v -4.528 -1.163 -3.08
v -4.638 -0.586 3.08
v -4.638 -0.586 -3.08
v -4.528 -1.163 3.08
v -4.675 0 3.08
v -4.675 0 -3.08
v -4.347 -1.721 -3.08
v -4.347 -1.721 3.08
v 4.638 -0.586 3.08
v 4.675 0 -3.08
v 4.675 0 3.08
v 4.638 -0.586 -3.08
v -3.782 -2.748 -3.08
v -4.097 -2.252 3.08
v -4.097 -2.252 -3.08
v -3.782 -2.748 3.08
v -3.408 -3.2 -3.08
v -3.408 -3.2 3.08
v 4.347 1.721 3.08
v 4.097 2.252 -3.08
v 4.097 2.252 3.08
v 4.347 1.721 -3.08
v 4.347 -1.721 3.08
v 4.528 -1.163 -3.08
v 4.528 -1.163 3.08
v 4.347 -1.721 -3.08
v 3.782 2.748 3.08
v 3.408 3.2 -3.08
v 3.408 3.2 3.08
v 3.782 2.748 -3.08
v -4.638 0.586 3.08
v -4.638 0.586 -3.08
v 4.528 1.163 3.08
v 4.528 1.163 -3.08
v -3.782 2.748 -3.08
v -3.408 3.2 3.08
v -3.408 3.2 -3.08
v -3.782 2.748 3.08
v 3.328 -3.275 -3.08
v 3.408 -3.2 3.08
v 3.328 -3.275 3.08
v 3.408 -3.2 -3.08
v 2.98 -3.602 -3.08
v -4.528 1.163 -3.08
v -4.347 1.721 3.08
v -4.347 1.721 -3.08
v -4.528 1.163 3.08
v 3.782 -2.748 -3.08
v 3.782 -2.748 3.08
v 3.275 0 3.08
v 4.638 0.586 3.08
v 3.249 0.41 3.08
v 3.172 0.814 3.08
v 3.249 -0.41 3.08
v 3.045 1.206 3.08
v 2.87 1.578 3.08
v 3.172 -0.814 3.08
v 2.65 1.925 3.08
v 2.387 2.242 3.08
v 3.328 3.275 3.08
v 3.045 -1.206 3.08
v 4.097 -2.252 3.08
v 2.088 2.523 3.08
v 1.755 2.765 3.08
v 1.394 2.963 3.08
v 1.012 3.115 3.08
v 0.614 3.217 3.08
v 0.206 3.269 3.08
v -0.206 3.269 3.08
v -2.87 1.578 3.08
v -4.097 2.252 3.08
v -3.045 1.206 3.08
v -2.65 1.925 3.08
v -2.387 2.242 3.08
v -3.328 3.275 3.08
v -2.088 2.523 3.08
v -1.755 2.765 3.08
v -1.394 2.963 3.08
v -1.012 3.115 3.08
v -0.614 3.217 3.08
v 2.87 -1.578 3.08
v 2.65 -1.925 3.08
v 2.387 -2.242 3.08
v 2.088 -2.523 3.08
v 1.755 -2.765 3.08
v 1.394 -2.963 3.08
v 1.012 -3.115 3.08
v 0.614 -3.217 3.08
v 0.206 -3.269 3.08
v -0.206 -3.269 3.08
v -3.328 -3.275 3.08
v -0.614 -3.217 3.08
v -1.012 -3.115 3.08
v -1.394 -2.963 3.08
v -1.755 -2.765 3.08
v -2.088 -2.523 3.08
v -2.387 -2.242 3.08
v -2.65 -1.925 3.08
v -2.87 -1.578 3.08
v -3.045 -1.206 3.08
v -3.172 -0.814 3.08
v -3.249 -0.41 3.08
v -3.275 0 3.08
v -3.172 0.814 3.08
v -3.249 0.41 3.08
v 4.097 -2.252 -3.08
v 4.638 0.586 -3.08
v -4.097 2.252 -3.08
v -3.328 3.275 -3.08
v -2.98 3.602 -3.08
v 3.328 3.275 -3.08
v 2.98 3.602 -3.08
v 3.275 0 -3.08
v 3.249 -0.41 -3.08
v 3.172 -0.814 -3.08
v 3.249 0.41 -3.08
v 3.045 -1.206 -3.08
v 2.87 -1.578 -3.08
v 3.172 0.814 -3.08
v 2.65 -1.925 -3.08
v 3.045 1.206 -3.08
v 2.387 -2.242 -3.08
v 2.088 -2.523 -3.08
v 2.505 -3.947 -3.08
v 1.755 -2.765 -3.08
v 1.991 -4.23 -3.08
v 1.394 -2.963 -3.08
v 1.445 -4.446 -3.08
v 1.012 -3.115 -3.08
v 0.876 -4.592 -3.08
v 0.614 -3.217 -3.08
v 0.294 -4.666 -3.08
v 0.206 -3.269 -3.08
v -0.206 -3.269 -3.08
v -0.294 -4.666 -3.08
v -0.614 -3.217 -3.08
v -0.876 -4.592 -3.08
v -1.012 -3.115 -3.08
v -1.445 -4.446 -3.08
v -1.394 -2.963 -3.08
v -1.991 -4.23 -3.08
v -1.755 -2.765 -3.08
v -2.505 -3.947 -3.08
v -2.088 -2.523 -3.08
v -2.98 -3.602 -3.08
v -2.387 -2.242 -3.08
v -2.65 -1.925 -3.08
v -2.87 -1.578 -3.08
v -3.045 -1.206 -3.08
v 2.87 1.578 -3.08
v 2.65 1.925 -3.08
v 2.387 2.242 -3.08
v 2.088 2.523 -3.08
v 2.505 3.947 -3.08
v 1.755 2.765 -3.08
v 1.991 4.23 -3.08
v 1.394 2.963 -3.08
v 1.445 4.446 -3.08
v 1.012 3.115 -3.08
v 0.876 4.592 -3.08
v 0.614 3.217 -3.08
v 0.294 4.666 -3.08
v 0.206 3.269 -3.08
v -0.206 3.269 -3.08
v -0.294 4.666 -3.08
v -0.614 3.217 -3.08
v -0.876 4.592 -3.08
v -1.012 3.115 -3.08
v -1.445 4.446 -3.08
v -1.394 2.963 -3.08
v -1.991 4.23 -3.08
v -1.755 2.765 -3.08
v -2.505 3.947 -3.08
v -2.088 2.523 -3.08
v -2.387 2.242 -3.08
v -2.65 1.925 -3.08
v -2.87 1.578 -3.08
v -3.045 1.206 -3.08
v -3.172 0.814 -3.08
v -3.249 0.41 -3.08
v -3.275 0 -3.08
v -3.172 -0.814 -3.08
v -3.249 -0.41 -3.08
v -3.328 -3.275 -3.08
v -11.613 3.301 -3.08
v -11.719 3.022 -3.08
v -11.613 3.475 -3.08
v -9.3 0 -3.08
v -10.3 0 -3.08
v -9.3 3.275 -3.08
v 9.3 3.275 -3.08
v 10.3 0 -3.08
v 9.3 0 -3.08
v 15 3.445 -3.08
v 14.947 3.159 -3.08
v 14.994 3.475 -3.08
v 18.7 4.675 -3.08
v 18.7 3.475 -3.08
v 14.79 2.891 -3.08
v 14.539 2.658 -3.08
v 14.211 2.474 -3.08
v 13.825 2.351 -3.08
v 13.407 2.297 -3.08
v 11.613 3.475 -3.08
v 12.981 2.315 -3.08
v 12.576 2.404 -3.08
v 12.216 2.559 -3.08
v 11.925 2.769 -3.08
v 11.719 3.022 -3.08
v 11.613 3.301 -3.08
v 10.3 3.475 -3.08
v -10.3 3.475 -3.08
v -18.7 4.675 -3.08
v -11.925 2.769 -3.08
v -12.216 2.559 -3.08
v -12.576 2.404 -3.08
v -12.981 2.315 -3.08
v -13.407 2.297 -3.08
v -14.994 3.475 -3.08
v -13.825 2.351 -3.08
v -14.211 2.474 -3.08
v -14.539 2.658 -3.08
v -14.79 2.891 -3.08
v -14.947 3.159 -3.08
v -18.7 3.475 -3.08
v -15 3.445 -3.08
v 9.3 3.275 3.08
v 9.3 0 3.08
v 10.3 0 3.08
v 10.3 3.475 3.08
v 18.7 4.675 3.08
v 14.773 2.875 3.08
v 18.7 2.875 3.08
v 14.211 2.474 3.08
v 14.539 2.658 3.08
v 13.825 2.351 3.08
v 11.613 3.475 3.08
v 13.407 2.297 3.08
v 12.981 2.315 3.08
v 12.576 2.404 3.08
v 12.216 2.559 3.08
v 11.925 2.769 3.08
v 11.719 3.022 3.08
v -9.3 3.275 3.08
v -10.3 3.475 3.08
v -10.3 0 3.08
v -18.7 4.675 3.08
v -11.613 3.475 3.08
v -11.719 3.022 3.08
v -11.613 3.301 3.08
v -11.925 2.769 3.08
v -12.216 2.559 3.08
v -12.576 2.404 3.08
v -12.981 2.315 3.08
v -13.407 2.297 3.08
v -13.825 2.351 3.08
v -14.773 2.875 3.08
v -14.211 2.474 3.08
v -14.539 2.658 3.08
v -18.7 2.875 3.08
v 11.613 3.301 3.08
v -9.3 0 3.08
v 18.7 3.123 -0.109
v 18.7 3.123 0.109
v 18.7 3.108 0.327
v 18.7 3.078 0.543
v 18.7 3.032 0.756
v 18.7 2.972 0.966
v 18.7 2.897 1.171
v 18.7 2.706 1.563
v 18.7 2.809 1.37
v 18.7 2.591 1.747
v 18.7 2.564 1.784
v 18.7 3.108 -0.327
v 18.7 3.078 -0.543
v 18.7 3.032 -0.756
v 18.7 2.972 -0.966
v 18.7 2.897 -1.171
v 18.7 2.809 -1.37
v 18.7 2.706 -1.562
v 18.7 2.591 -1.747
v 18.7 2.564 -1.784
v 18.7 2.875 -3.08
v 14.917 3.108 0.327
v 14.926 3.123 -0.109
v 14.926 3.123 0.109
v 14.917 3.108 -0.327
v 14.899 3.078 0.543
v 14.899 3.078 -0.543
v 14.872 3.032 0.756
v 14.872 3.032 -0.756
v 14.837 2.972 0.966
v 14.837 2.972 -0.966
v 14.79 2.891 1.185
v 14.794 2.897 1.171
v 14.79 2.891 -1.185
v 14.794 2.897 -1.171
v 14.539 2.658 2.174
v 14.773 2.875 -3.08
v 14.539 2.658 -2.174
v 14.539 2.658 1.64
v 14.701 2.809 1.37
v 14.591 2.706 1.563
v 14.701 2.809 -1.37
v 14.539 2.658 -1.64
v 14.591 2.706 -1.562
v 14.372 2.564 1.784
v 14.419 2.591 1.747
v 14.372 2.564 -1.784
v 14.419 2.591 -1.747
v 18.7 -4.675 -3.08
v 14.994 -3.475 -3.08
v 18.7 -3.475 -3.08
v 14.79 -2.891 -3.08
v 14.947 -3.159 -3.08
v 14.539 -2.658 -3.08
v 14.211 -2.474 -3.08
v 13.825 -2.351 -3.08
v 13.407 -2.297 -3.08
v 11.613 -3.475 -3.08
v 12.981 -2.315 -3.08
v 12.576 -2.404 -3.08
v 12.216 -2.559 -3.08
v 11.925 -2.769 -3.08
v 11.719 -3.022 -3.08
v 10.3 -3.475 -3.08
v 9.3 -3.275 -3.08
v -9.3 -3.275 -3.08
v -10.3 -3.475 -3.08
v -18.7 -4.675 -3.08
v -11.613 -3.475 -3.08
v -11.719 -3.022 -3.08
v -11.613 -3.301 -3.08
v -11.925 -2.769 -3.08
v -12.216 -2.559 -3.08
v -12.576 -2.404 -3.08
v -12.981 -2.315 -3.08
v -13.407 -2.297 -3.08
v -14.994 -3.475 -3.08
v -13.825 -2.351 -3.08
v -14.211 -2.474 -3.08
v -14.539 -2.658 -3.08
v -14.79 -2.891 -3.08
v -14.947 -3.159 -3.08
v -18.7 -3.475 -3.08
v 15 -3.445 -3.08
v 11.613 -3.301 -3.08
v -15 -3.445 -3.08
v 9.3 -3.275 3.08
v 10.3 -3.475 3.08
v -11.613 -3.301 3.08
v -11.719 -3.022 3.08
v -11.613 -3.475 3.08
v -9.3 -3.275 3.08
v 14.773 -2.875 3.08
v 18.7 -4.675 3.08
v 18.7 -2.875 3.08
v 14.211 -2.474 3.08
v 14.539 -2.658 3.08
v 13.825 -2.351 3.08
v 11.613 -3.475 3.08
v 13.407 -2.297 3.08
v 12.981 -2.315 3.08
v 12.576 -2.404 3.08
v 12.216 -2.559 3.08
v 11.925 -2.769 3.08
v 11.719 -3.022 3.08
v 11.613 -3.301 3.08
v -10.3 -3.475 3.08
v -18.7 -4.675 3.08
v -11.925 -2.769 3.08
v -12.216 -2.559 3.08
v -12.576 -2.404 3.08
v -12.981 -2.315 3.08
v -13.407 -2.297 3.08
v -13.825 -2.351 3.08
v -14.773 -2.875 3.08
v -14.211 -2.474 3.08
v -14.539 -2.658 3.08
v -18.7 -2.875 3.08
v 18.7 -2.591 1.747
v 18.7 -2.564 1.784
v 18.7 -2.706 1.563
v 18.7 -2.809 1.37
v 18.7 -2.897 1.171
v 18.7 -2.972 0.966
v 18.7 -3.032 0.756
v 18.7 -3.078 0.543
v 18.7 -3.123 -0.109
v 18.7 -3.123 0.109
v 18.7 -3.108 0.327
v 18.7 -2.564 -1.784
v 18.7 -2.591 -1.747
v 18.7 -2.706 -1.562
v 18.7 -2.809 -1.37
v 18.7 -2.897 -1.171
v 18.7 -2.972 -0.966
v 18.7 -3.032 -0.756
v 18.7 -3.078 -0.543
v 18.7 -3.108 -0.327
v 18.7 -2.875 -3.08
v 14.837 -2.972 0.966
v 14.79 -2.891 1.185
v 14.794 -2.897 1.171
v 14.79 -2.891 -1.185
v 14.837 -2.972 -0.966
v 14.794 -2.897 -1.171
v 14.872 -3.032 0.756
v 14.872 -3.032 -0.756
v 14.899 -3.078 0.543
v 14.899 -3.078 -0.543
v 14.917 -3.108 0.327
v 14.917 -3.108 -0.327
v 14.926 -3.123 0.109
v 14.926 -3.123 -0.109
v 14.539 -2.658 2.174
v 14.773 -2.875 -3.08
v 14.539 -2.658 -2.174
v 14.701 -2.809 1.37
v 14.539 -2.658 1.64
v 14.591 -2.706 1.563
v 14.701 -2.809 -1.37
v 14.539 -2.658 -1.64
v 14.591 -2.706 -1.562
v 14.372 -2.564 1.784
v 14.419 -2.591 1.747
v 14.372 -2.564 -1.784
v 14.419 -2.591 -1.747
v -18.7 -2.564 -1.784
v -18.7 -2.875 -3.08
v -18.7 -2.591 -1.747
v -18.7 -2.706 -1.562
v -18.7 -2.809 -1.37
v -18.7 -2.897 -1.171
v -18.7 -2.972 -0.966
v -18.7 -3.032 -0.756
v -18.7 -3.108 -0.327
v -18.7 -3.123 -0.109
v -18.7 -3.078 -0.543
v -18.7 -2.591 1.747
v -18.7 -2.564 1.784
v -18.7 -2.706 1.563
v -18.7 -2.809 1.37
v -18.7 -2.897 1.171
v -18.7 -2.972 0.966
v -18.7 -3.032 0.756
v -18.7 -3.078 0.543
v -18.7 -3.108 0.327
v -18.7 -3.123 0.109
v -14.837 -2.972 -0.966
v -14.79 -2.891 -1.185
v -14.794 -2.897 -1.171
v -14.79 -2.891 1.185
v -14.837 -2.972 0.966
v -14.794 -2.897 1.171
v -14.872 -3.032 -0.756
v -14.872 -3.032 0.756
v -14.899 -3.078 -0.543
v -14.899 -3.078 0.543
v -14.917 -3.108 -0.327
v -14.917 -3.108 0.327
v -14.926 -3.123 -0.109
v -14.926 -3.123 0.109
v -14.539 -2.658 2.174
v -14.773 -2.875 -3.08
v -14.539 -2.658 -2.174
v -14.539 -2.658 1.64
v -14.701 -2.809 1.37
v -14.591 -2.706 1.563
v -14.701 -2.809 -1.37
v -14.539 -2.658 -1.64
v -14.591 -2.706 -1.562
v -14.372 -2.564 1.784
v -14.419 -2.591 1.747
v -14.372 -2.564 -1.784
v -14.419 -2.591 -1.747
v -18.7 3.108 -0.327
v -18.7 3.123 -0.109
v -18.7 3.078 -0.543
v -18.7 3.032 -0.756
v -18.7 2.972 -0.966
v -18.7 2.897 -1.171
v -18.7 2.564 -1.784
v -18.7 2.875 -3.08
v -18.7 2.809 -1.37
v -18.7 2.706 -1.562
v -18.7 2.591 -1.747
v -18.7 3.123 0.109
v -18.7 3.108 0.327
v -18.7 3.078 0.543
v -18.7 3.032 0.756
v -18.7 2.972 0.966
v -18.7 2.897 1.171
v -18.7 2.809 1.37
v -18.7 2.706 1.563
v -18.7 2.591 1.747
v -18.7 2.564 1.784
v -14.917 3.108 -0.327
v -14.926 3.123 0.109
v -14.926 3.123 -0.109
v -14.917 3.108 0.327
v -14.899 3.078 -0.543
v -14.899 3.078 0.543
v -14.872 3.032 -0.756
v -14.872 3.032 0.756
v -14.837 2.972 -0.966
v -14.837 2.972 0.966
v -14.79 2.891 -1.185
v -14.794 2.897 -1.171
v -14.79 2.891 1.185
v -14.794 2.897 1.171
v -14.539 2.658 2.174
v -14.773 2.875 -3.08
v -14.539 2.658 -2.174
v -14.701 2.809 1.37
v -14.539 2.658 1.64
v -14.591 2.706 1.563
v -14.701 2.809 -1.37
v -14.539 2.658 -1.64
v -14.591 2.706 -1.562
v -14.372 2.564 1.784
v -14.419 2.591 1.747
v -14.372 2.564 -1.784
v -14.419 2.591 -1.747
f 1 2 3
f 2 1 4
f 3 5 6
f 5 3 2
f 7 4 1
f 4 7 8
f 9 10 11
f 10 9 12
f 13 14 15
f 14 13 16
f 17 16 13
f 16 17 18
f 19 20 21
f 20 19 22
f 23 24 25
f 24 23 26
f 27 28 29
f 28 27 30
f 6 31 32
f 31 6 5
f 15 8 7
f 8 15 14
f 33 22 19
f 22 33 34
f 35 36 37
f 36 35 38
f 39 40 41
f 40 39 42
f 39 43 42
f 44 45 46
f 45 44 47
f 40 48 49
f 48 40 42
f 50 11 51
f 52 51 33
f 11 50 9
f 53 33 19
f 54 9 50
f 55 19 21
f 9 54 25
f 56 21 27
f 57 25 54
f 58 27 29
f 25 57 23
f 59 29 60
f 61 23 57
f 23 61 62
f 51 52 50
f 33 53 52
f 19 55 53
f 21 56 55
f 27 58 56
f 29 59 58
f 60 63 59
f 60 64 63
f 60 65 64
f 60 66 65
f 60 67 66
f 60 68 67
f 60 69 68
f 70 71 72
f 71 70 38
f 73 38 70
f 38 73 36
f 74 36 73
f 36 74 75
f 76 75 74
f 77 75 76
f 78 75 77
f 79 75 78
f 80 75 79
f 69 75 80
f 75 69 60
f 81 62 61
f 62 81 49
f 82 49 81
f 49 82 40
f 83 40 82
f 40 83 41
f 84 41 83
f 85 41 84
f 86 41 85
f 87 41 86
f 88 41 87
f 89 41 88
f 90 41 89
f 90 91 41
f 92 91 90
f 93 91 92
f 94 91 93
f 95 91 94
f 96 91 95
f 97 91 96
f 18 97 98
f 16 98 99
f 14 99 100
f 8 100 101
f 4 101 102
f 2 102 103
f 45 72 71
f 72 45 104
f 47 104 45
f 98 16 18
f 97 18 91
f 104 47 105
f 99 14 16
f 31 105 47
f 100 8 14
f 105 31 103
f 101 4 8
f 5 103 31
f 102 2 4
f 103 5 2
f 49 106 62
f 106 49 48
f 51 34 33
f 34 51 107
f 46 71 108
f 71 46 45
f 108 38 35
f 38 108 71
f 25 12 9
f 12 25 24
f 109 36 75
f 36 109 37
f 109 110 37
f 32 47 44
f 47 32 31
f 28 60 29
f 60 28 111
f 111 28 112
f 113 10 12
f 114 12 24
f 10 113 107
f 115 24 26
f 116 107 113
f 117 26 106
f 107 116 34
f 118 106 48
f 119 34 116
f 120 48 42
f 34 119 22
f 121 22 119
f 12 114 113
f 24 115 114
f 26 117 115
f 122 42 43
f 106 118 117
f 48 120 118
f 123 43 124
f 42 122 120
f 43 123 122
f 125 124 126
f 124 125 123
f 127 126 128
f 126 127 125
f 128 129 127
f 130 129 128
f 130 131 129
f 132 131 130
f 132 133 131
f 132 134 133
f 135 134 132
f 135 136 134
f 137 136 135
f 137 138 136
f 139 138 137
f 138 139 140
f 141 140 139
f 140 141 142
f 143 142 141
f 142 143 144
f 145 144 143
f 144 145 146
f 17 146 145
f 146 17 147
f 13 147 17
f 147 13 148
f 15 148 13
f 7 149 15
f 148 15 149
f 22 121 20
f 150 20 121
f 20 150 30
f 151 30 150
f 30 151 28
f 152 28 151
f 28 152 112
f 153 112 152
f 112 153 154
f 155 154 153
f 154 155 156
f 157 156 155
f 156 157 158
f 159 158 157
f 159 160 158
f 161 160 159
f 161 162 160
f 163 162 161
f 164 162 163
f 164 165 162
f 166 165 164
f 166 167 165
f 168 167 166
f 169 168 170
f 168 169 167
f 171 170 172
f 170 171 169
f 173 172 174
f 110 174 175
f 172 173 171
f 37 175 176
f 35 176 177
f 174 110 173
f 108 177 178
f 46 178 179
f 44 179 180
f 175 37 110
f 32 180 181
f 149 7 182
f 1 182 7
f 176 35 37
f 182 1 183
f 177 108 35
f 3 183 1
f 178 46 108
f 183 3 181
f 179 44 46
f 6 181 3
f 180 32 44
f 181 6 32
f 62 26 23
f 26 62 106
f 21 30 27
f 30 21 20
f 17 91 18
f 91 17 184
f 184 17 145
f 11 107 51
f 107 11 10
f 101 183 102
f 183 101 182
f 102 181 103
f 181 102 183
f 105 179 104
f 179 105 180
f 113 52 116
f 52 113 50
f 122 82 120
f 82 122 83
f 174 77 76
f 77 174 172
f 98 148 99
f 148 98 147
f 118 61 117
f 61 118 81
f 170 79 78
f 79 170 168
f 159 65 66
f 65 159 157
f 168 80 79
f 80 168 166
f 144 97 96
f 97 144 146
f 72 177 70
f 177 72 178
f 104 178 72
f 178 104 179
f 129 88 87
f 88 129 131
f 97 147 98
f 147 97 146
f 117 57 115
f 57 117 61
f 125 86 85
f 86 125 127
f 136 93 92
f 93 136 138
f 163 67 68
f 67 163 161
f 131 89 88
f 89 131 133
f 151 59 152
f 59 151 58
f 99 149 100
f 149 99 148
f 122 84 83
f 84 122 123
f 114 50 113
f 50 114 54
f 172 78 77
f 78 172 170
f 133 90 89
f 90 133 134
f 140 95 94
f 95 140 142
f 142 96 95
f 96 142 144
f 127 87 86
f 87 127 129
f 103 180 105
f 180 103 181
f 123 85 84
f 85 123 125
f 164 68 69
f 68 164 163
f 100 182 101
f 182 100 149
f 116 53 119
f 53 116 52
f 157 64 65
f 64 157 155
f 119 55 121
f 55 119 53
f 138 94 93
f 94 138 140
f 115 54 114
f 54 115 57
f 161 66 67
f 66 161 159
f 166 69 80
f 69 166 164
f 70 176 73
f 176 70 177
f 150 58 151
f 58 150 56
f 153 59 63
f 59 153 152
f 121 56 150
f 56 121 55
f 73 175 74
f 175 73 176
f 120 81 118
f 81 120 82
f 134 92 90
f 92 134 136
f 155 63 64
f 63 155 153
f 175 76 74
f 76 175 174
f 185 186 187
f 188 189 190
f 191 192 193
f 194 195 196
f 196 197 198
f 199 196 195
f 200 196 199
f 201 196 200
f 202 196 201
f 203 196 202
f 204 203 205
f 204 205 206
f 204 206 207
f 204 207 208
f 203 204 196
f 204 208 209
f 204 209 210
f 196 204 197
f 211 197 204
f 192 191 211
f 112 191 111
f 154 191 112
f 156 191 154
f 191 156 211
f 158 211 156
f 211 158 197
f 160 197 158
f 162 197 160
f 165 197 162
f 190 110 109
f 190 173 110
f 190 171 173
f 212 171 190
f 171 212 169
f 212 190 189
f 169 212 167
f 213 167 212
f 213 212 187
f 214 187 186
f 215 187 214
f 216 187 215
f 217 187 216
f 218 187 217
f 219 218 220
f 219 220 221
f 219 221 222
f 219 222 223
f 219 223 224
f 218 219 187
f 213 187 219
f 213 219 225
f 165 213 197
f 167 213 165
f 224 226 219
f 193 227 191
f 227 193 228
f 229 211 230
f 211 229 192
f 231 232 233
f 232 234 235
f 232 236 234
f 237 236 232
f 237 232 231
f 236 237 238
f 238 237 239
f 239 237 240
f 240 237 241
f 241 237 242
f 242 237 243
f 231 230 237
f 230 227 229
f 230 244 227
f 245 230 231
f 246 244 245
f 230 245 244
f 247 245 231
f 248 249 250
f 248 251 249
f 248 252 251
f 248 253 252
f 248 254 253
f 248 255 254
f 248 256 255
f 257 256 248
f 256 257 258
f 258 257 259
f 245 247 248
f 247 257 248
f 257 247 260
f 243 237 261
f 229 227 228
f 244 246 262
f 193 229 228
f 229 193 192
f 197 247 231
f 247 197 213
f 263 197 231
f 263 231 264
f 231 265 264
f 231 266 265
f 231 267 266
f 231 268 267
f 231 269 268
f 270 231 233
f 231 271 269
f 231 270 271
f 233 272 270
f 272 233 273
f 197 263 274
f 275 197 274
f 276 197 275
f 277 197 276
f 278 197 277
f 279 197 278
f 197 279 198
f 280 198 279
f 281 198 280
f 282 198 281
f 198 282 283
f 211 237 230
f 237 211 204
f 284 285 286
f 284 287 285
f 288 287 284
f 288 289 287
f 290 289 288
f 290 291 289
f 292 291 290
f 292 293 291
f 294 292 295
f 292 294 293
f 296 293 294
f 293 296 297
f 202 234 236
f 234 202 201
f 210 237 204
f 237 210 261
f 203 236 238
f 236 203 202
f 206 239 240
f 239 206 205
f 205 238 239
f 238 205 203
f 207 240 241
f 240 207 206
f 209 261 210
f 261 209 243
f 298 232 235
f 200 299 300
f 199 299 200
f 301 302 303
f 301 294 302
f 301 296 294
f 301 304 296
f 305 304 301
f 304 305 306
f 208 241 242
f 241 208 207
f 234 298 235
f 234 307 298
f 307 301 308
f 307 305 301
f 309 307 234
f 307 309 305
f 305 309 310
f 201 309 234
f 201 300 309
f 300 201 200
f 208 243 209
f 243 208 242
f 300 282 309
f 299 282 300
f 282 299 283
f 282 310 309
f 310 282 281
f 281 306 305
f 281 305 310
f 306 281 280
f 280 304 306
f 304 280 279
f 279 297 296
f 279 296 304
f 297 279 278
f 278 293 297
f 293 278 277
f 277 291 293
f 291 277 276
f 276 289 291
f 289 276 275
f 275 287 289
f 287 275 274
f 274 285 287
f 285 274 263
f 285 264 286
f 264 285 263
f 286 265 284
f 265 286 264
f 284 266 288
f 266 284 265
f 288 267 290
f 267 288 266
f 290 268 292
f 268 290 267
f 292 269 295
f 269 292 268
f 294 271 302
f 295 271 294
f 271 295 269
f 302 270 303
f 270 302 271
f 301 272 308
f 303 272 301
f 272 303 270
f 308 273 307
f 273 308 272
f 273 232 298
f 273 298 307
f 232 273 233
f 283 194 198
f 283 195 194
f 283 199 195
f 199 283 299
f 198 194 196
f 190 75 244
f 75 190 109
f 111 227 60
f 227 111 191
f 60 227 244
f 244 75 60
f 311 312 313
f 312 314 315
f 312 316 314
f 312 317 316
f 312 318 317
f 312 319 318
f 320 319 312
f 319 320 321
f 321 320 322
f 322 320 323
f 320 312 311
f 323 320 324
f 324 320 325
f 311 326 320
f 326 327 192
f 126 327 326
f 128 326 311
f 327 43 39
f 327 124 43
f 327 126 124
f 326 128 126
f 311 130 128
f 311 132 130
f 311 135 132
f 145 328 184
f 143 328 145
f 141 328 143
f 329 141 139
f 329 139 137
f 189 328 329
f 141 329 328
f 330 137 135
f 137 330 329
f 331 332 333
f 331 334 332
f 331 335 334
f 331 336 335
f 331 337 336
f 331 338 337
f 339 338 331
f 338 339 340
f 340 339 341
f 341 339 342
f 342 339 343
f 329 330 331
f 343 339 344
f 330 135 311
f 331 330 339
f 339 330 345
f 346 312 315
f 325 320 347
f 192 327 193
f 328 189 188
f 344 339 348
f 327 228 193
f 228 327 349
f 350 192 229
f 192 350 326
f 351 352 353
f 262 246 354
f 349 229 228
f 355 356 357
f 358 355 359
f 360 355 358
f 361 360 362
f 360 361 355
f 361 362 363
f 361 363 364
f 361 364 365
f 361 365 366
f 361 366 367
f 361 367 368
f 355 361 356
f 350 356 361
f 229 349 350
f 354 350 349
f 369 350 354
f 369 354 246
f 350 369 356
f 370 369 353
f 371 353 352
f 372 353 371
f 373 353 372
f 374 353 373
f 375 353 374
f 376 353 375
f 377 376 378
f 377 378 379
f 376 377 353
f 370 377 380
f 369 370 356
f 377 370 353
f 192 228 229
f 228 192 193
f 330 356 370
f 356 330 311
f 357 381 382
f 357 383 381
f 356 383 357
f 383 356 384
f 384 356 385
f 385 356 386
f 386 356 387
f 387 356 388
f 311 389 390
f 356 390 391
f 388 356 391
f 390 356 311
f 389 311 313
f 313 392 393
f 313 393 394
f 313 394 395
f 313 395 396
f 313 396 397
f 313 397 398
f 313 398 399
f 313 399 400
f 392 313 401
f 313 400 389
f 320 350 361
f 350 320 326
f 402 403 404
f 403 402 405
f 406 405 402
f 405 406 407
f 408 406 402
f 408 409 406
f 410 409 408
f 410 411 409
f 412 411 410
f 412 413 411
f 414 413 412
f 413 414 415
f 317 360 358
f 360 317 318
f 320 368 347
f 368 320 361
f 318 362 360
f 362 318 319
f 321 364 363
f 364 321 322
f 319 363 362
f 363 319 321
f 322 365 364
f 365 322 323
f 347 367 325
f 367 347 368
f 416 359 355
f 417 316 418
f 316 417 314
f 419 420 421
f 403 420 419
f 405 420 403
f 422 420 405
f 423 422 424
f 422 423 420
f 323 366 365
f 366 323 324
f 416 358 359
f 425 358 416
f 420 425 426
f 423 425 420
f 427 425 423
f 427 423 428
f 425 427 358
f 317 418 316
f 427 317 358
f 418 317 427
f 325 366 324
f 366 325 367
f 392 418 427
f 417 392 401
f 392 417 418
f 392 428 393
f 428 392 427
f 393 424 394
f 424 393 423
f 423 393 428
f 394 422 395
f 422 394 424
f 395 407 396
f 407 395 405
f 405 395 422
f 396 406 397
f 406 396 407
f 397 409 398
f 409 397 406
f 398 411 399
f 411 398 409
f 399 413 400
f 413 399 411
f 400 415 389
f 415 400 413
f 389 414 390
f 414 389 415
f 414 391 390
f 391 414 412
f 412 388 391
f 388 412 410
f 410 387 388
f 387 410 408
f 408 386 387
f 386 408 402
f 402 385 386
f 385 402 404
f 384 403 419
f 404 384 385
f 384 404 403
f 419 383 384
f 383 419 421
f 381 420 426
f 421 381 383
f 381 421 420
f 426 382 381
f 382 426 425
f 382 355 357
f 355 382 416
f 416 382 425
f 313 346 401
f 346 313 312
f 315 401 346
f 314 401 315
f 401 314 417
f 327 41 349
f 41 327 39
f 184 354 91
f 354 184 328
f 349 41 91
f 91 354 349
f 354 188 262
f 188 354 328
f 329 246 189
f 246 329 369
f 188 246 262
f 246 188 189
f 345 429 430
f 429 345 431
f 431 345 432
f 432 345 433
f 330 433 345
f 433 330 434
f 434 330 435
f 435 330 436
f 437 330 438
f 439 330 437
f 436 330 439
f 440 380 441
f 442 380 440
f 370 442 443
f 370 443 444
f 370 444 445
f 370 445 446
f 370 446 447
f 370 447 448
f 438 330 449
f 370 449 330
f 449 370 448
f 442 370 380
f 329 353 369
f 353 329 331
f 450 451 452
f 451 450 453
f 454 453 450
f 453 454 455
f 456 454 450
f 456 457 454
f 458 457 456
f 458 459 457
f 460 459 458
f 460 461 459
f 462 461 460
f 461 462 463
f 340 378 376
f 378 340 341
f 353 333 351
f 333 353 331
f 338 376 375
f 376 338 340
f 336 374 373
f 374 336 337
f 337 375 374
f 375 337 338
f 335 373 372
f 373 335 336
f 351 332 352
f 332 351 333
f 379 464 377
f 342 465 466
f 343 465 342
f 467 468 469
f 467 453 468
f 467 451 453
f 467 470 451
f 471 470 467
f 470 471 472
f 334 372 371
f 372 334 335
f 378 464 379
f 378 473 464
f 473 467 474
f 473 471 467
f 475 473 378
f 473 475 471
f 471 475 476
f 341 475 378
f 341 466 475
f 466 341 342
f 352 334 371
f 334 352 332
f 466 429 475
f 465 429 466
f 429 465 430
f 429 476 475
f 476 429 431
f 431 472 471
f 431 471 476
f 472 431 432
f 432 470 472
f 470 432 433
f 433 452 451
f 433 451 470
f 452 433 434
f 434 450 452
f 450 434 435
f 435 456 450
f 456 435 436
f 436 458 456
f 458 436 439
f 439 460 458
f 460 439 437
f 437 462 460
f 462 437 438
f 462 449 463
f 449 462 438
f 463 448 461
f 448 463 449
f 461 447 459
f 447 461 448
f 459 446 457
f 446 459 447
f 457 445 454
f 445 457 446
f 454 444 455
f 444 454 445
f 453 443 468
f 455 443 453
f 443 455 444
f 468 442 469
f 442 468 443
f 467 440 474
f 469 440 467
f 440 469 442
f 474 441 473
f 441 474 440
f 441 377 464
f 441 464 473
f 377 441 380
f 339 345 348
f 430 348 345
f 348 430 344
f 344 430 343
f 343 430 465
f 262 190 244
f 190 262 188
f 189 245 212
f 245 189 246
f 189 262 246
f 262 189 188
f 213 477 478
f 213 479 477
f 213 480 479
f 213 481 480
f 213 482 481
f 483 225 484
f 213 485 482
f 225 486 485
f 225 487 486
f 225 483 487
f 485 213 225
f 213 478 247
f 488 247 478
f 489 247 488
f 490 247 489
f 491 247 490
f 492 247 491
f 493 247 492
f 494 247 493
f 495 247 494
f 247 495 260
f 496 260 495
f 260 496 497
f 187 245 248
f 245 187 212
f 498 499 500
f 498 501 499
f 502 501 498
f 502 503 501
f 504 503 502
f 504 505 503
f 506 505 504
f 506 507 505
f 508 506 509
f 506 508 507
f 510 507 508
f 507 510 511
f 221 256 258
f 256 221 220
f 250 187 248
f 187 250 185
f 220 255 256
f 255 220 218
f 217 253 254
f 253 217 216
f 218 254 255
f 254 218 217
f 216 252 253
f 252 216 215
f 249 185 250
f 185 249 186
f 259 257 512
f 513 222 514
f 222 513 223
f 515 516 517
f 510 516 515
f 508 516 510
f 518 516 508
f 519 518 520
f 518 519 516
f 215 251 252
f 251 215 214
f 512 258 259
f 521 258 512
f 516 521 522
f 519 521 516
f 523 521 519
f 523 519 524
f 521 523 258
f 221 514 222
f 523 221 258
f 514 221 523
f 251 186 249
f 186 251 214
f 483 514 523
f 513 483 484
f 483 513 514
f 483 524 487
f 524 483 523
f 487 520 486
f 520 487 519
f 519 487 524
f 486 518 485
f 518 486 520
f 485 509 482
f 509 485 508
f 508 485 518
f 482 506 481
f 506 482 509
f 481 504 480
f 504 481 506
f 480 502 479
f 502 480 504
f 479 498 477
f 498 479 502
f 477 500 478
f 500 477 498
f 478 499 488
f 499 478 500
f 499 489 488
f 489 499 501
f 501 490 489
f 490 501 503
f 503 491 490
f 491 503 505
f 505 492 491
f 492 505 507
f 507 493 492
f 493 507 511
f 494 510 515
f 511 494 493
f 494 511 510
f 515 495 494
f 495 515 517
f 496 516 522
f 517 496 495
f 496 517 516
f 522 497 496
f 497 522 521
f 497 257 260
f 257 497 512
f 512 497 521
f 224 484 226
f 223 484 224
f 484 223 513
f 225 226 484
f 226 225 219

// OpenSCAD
// file: lib/knex_lib.scad
// K'Nex Parts Library — shared modules for all part SCADs
// Geometry derived from https://www.printables.com/model/143840-knex-parts-customizable
// Measurements in millimeters (digital calipers)

knexDiameter = 6.25;

// --- Rod modules ---

module RodEnd(height) {
    difference() {
        cylinder(h=height, d=knexDiameter, $fn=50);
        // Snap groove near the tip
        translate([0, 0, height - 3.1])
        scale([1, 1, 1.93])
        rotate_extrude(convexity=10, $fn=30)
        translate([3.125, 0, 0])
        scale([1, 1, 0])
        circle(r=0.905, $fn=20);
    }
}

module RodCenter(length) {
    // Cross-shaped center section (+ profile)
    intersection() {
        cylinder(h=length, d=knexDiameter, $fn=50);
        union() {
            translate([-.95, -knexDiameter/2, 0])
            cube([1.9, knexDiameter + 1, length]);
            translate([-knexDiameter/2, -.95, 0])
            cube([knexDiameter + 1, 1.9, length]);
        }
    }
}

module fullRod(endHeight, centerLength) {
    // Builds along Z: from -endHeight to centerLength+endHeight
    translate([0, 0, centerLength])
    RodEnd(endHeight);
    RodCenter(centerLength);
    mirror([0, 0, 1])
    RodEnd(endHeight);
}

module fullRod2(externalLength, internalLength) {
    // Convenience: specify overall and center-section lengths
    fullRod((externalLength - internalLength) / 2, internalLength);
}

// --- Connector modules ---

module ConnectorCenter(height, width) {
    difference() {
        cylinder(h=height, d=6.55 + width * 2, $fn=50);
        translate([0, 0, -0.5])
        cylinder(h=height + 1, d=6.55, $fn=50);
    }
}

module ConnectorEndpt(i, c, a, j) {
    union() {
        translate([0, 0, 9.4 - 1])
        cube([6.16, 9.35/2, 1]);
        cube([6.16, 1.2, 9.4]);
        translate([6.16/2, 1.23, 6.16 - 3.8/5])
        scale([1, 2.3, 3.4])
        rotate([0, 90, 0])
        cylinder(d=1, h=6.16, $fn=25, center=true);
        linear_extrude(height=6)
        difference() {
            polygon(points=[
                [0, 0], [6.16, 0], [6.16, 1.8],
                [6.16 - 1.46, 2.15], [1.46, 2.15], [0, 1.8]
            ]);
            translate([6.16/2, 9.35/2, 0])
            circle(d=6.25, $fn=90);
        }
    }
    if (i > 0) {
        if ((((i == c && j == 1) || (i == 1 && j == 2)) && c < 8) || a - 360 > 80) {
            // Straight locking tab (for end arms or wide-angle connectors)
            translate([0, 0, 9])
            cube([6.16, 1.4, 10]);
        }
        else {
            // Angled locking tab (for tight-angle connectors)
            translate([0, 0, 9.25])
            rotate([-45/2])
            cube([6.16, 1.4, 7]);
        }
    }
}

module ConnectorEnd(i=0, c=0, a=45) {
    translate([0, -9.35/2, 6.16])
    rotate([0, 90, 0])
    union() {
        ConnectorEndpt(i, c, a, 1);
        translate([0, 9.35, 0])
        mirror([0, 1, 0])
        ConnectorEndpt(i, c, a, 2);
    }
}

// Arm offset from center to ConnectorEnd origin
_arm_offset = -(23.15 - (6.5 + 1.4) / 2) + 0.5;

module Connector(c, a=45) {
    // c = number of arms, a = angle parameter (use 360+spacing for proper tab logic)
    // Effective arm spacing = a mod 360
    union() {
        ConnectorCenter(6.16, 1.4);
        for (i = [1:c]) {
            rotate([0, 0, (i-1) * a])
            translate([_arm_offset, 0, 0])
            ConnectorEnd(i, c, a);
        }
    }
}
// main file
// K'NEX Orange 2-Way Straight Connector (180°)
include <lib/knex_lib.scad>
$fn = 72;

translate([0, 0, -6.16/2])
rotate([0, 0, 180])
Connector(2, 540);
